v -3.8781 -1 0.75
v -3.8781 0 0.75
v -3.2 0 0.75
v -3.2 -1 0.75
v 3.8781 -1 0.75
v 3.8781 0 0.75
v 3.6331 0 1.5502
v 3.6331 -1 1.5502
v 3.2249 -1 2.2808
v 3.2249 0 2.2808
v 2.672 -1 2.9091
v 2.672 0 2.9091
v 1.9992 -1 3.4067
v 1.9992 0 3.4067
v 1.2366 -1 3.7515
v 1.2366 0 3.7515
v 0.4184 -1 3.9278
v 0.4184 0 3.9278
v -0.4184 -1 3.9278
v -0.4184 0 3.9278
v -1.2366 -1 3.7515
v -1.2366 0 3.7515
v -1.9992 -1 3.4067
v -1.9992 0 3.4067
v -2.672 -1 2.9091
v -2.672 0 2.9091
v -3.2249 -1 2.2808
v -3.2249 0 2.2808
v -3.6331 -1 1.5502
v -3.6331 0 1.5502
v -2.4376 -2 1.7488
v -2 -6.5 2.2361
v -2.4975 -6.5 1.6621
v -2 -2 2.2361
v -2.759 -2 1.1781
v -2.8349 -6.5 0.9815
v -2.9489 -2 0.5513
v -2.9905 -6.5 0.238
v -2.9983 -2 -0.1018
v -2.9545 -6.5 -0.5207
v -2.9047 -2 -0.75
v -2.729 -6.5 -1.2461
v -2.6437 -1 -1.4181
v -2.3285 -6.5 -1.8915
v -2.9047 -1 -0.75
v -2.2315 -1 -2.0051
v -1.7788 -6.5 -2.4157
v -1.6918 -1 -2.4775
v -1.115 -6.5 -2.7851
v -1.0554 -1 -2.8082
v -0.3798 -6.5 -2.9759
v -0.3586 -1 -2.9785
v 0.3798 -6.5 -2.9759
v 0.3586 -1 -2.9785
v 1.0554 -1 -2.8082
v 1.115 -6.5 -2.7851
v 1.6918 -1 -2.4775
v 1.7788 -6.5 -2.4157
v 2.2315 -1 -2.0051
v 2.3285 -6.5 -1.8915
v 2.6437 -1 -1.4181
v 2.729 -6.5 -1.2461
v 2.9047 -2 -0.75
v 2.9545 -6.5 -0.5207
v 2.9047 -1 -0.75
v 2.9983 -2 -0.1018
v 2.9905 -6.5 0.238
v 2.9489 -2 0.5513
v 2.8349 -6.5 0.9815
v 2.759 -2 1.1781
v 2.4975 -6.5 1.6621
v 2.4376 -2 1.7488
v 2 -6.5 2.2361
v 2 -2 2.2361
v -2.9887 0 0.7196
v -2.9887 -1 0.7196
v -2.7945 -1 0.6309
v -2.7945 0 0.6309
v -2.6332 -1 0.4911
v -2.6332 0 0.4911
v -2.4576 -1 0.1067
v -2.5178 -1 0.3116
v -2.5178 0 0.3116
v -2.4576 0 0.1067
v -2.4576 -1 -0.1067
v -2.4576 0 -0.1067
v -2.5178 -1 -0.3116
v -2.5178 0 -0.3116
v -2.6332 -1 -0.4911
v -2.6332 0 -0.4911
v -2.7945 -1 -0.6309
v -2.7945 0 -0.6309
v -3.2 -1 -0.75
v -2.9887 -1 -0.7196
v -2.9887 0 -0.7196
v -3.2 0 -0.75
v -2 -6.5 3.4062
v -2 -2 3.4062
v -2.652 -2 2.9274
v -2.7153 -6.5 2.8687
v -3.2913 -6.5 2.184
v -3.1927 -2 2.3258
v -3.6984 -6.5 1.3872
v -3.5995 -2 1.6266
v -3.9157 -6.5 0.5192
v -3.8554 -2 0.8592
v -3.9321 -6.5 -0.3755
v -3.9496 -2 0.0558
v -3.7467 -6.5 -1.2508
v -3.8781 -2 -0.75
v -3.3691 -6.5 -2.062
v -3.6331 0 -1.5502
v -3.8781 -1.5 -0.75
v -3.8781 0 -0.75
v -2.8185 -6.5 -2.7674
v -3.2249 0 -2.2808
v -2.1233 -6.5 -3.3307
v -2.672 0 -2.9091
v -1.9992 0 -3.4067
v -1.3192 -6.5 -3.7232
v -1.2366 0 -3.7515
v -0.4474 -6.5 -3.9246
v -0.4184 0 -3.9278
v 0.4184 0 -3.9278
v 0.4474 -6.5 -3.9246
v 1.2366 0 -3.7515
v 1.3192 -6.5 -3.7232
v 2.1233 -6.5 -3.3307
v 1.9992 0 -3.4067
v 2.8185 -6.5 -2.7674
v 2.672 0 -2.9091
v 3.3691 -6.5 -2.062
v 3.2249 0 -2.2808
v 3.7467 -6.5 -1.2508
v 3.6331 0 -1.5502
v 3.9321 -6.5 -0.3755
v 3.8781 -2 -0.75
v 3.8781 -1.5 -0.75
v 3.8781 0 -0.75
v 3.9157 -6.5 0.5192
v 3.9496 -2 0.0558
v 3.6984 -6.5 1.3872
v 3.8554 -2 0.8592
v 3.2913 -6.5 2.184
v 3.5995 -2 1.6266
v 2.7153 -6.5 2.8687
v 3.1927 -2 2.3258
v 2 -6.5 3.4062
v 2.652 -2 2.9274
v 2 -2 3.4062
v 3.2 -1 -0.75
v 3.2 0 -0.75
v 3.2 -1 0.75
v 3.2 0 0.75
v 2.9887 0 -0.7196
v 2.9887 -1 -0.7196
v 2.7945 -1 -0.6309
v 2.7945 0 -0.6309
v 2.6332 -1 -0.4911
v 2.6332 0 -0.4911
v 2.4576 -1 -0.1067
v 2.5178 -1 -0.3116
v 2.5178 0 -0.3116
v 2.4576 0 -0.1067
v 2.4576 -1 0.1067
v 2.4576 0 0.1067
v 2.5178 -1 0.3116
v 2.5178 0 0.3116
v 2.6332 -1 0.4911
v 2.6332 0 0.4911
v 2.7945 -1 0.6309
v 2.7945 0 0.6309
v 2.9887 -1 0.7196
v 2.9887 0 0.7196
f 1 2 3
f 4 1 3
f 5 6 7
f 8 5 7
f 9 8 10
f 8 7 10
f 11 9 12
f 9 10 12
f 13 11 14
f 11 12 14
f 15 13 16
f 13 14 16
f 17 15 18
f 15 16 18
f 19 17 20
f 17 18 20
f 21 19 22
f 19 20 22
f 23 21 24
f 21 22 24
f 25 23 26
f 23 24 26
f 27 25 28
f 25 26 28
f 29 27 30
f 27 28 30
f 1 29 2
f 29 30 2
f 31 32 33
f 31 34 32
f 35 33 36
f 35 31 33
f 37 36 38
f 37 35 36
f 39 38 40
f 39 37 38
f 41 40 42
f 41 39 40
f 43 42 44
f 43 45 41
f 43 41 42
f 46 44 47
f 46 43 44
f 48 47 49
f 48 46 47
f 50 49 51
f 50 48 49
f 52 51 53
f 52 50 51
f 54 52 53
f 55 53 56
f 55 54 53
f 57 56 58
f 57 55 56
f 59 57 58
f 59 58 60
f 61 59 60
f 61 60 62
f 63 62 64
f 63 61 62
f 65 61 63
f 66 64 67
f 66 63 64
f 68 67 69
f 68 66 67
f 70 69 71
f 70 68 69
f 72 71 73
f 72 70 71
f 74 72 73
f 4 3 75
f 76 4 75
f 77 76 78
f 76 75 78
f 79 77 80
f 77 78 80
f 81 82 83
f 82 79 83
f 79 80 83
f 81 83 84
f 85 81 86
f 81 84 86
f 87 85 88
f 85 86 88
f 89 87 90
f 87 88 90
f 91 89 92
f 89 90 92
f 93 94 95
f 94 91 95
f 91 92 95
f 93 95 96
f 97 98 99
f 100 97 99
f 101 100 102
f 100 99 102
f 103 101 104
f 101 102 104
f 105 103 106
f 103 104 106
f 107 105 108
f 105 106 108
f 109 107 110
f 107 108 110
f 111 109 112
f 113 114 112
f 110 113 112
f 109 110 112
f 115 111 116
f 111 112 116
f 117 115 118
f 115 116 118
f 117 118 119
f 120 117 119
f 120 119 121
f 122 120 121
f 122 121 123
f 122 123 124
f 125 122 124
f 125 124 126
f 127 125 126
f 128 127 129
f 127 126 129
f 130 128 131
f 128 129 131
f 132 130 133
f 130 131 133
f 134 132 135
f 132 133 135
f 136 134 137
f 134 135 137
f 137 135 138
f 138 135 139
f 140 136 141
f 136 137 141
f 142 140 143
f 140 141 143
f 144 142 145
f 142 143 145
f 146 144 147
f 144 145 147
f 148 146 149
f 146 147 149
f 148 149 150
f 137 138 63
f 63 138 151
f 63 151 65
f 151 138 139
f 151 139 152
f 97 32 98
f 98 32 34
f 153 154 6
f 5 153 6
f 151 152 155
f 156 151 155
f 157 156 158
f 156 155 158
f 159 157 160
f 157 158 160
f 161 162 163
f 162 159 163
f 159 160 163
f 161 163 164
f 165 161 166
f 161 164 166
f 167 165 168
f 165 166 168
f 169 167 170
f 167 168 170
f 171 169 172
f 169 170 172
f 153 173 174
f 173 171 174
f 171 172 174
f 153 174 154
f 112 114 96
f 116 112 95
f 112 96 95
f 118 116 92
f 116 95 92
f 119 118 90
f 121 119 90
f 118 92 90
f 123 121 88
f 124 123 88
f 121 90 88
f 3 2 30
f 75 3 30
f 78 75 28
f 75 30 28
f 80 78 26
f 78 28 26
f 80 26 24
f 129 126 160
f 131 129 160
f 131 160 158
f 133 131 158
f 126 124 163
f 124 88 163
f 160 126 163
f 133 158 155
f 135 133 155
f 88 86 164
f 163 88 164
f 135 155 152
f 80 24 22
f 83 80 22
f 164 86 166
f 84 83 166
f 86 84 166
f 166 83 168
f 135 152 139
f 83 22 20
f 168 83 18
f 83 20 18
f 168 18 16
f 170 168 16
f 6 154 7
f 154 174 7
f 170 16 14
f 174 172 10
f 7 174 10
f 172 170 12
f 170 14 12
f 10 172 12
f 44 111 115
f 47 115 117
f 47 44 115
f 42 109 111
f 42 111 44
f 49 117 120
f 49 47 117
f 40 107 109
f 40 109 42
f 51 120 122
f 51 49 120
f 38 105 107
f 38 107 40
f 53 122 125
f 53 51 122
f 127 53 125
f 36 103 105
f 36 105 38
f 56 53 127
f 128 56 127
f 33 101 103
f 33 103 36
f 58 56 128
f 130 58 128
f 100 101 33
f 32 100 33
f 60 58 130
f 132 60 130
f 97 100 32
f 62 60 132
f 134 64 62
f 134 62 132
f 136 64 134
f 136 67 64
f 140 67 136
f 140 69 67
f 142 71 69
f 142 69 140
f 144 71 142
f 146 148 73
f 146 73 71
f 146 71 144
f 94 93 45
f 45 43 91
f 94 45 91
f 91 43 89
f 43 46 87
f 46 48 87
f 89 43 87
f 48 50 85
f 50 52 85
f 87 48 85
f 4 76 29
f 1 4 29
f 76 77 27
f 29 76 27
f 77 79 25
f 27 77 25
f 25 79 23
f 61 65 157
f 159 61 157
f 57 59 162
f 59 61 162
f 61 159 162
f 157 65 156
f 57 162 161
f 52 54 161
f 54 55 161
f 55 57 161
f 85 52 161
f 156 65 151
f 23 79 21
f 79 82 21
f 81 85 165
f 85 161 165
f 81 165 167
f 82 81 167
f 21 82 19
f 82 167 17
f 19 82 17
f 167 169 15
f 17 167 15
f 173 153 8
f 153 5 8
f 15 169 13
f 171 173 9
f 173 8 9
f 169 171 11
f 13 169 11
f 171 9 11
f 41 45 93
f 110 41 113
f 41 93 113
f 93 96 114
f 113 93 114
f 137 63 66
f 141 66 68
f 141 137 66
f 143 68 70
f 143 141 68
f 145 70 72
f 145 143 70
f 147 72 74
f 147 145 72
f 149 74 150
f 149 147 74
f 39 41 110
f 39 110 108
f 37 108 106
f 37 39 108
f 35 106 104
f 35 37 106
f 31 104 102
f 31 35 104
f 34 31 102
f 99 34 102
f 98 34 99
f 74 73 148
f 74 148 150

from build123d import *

# Parameters (mm, degrees)
F4_R      = 3.95
F4_R_2    = 3
F5_DEPTH  = 6.5
F6_DEPTH  = 1
F7_W      = 4
F7_H      = 5.5
F8_DEPTH  = 3.951
F10_DEPTH = 1.5
F12_W     = 1
F12_H     = 4.7
F13_DEPTH = 7.901


with BuildPart() as f5:
    # F4 (on Front) → F5 (new body)
    with BuildSketch(Plane.XZ):
        Circle(F4_R)
        Circle(F4_R_2, mode=Mode.SUBTRACT)
    extrude(amount=F5_DEPTH)

    # F4 (on Front) → F6 (join)
    with BuildSketch(Plane.XZ):
        Circle(F4_R_2)
    extrude(amount=F6_DEPTH)

    # F7 (on Top) → F8 (cut, through all)
    with BuildSketch(Plane.XY):
        with Locations((0, -3.75)):
            Rectangle(F7_W, F7_H)
    extrude(amount=F8_DEPTH, mode=Mode.SUBTRACT)

    # F9 (on face) → F10 (cut)
    with BuildSketch(Plane(origin=(0, 0, 0), x_dir=(-1, 0, 0), z_dir=(0, 1, 0))):
        with BuildLine():
            Line((-3.2, 0.75), (-3.8781438859, 0.75))
            ThreePointArc((-3.8781438859, 0.75), (-3.95, 0), (-3.8781438859, -0.75))
            Line((-3.8781438859, -0.75), (-3.2, -0.75))
            ThreePointArc((-3.2, -0.75), (-2.45, 0), (-3.2, 0.75))
        make_face()
        with BuildLine():
            ThreePointArc((3.95, 0), (3.9319949357, 0.3767171688), (3.8781438859, 0.75))
            Line((3.8781438859, 0.75), (3.2, 0.75))
            ThreePointArc((3.2, 0.75), (2.45, 0), (3.2, -0.75))
            Line((3.2, -0.75), (3.8781438859, -0.75))
            ThreePointArc((3.8781438859, -0.75), (3.9319949357, -0.3767171688), (3.95, 0))
        make_face()
    extrude(amount=-F10_DEPTH, mode=Mode.SUBTRACT)

    # F12 (on offset) → F13 (cut, through all)
    with BuildSketch(Plane.YZ.offset(3.95)):
        with Locations((-1.5, 1.6)):
            Rectangle(F12_W, F12_H)
    extrude(amount=-F13_DEPTH, mode=Mode.SUBTRACT)


solid = f5.part
